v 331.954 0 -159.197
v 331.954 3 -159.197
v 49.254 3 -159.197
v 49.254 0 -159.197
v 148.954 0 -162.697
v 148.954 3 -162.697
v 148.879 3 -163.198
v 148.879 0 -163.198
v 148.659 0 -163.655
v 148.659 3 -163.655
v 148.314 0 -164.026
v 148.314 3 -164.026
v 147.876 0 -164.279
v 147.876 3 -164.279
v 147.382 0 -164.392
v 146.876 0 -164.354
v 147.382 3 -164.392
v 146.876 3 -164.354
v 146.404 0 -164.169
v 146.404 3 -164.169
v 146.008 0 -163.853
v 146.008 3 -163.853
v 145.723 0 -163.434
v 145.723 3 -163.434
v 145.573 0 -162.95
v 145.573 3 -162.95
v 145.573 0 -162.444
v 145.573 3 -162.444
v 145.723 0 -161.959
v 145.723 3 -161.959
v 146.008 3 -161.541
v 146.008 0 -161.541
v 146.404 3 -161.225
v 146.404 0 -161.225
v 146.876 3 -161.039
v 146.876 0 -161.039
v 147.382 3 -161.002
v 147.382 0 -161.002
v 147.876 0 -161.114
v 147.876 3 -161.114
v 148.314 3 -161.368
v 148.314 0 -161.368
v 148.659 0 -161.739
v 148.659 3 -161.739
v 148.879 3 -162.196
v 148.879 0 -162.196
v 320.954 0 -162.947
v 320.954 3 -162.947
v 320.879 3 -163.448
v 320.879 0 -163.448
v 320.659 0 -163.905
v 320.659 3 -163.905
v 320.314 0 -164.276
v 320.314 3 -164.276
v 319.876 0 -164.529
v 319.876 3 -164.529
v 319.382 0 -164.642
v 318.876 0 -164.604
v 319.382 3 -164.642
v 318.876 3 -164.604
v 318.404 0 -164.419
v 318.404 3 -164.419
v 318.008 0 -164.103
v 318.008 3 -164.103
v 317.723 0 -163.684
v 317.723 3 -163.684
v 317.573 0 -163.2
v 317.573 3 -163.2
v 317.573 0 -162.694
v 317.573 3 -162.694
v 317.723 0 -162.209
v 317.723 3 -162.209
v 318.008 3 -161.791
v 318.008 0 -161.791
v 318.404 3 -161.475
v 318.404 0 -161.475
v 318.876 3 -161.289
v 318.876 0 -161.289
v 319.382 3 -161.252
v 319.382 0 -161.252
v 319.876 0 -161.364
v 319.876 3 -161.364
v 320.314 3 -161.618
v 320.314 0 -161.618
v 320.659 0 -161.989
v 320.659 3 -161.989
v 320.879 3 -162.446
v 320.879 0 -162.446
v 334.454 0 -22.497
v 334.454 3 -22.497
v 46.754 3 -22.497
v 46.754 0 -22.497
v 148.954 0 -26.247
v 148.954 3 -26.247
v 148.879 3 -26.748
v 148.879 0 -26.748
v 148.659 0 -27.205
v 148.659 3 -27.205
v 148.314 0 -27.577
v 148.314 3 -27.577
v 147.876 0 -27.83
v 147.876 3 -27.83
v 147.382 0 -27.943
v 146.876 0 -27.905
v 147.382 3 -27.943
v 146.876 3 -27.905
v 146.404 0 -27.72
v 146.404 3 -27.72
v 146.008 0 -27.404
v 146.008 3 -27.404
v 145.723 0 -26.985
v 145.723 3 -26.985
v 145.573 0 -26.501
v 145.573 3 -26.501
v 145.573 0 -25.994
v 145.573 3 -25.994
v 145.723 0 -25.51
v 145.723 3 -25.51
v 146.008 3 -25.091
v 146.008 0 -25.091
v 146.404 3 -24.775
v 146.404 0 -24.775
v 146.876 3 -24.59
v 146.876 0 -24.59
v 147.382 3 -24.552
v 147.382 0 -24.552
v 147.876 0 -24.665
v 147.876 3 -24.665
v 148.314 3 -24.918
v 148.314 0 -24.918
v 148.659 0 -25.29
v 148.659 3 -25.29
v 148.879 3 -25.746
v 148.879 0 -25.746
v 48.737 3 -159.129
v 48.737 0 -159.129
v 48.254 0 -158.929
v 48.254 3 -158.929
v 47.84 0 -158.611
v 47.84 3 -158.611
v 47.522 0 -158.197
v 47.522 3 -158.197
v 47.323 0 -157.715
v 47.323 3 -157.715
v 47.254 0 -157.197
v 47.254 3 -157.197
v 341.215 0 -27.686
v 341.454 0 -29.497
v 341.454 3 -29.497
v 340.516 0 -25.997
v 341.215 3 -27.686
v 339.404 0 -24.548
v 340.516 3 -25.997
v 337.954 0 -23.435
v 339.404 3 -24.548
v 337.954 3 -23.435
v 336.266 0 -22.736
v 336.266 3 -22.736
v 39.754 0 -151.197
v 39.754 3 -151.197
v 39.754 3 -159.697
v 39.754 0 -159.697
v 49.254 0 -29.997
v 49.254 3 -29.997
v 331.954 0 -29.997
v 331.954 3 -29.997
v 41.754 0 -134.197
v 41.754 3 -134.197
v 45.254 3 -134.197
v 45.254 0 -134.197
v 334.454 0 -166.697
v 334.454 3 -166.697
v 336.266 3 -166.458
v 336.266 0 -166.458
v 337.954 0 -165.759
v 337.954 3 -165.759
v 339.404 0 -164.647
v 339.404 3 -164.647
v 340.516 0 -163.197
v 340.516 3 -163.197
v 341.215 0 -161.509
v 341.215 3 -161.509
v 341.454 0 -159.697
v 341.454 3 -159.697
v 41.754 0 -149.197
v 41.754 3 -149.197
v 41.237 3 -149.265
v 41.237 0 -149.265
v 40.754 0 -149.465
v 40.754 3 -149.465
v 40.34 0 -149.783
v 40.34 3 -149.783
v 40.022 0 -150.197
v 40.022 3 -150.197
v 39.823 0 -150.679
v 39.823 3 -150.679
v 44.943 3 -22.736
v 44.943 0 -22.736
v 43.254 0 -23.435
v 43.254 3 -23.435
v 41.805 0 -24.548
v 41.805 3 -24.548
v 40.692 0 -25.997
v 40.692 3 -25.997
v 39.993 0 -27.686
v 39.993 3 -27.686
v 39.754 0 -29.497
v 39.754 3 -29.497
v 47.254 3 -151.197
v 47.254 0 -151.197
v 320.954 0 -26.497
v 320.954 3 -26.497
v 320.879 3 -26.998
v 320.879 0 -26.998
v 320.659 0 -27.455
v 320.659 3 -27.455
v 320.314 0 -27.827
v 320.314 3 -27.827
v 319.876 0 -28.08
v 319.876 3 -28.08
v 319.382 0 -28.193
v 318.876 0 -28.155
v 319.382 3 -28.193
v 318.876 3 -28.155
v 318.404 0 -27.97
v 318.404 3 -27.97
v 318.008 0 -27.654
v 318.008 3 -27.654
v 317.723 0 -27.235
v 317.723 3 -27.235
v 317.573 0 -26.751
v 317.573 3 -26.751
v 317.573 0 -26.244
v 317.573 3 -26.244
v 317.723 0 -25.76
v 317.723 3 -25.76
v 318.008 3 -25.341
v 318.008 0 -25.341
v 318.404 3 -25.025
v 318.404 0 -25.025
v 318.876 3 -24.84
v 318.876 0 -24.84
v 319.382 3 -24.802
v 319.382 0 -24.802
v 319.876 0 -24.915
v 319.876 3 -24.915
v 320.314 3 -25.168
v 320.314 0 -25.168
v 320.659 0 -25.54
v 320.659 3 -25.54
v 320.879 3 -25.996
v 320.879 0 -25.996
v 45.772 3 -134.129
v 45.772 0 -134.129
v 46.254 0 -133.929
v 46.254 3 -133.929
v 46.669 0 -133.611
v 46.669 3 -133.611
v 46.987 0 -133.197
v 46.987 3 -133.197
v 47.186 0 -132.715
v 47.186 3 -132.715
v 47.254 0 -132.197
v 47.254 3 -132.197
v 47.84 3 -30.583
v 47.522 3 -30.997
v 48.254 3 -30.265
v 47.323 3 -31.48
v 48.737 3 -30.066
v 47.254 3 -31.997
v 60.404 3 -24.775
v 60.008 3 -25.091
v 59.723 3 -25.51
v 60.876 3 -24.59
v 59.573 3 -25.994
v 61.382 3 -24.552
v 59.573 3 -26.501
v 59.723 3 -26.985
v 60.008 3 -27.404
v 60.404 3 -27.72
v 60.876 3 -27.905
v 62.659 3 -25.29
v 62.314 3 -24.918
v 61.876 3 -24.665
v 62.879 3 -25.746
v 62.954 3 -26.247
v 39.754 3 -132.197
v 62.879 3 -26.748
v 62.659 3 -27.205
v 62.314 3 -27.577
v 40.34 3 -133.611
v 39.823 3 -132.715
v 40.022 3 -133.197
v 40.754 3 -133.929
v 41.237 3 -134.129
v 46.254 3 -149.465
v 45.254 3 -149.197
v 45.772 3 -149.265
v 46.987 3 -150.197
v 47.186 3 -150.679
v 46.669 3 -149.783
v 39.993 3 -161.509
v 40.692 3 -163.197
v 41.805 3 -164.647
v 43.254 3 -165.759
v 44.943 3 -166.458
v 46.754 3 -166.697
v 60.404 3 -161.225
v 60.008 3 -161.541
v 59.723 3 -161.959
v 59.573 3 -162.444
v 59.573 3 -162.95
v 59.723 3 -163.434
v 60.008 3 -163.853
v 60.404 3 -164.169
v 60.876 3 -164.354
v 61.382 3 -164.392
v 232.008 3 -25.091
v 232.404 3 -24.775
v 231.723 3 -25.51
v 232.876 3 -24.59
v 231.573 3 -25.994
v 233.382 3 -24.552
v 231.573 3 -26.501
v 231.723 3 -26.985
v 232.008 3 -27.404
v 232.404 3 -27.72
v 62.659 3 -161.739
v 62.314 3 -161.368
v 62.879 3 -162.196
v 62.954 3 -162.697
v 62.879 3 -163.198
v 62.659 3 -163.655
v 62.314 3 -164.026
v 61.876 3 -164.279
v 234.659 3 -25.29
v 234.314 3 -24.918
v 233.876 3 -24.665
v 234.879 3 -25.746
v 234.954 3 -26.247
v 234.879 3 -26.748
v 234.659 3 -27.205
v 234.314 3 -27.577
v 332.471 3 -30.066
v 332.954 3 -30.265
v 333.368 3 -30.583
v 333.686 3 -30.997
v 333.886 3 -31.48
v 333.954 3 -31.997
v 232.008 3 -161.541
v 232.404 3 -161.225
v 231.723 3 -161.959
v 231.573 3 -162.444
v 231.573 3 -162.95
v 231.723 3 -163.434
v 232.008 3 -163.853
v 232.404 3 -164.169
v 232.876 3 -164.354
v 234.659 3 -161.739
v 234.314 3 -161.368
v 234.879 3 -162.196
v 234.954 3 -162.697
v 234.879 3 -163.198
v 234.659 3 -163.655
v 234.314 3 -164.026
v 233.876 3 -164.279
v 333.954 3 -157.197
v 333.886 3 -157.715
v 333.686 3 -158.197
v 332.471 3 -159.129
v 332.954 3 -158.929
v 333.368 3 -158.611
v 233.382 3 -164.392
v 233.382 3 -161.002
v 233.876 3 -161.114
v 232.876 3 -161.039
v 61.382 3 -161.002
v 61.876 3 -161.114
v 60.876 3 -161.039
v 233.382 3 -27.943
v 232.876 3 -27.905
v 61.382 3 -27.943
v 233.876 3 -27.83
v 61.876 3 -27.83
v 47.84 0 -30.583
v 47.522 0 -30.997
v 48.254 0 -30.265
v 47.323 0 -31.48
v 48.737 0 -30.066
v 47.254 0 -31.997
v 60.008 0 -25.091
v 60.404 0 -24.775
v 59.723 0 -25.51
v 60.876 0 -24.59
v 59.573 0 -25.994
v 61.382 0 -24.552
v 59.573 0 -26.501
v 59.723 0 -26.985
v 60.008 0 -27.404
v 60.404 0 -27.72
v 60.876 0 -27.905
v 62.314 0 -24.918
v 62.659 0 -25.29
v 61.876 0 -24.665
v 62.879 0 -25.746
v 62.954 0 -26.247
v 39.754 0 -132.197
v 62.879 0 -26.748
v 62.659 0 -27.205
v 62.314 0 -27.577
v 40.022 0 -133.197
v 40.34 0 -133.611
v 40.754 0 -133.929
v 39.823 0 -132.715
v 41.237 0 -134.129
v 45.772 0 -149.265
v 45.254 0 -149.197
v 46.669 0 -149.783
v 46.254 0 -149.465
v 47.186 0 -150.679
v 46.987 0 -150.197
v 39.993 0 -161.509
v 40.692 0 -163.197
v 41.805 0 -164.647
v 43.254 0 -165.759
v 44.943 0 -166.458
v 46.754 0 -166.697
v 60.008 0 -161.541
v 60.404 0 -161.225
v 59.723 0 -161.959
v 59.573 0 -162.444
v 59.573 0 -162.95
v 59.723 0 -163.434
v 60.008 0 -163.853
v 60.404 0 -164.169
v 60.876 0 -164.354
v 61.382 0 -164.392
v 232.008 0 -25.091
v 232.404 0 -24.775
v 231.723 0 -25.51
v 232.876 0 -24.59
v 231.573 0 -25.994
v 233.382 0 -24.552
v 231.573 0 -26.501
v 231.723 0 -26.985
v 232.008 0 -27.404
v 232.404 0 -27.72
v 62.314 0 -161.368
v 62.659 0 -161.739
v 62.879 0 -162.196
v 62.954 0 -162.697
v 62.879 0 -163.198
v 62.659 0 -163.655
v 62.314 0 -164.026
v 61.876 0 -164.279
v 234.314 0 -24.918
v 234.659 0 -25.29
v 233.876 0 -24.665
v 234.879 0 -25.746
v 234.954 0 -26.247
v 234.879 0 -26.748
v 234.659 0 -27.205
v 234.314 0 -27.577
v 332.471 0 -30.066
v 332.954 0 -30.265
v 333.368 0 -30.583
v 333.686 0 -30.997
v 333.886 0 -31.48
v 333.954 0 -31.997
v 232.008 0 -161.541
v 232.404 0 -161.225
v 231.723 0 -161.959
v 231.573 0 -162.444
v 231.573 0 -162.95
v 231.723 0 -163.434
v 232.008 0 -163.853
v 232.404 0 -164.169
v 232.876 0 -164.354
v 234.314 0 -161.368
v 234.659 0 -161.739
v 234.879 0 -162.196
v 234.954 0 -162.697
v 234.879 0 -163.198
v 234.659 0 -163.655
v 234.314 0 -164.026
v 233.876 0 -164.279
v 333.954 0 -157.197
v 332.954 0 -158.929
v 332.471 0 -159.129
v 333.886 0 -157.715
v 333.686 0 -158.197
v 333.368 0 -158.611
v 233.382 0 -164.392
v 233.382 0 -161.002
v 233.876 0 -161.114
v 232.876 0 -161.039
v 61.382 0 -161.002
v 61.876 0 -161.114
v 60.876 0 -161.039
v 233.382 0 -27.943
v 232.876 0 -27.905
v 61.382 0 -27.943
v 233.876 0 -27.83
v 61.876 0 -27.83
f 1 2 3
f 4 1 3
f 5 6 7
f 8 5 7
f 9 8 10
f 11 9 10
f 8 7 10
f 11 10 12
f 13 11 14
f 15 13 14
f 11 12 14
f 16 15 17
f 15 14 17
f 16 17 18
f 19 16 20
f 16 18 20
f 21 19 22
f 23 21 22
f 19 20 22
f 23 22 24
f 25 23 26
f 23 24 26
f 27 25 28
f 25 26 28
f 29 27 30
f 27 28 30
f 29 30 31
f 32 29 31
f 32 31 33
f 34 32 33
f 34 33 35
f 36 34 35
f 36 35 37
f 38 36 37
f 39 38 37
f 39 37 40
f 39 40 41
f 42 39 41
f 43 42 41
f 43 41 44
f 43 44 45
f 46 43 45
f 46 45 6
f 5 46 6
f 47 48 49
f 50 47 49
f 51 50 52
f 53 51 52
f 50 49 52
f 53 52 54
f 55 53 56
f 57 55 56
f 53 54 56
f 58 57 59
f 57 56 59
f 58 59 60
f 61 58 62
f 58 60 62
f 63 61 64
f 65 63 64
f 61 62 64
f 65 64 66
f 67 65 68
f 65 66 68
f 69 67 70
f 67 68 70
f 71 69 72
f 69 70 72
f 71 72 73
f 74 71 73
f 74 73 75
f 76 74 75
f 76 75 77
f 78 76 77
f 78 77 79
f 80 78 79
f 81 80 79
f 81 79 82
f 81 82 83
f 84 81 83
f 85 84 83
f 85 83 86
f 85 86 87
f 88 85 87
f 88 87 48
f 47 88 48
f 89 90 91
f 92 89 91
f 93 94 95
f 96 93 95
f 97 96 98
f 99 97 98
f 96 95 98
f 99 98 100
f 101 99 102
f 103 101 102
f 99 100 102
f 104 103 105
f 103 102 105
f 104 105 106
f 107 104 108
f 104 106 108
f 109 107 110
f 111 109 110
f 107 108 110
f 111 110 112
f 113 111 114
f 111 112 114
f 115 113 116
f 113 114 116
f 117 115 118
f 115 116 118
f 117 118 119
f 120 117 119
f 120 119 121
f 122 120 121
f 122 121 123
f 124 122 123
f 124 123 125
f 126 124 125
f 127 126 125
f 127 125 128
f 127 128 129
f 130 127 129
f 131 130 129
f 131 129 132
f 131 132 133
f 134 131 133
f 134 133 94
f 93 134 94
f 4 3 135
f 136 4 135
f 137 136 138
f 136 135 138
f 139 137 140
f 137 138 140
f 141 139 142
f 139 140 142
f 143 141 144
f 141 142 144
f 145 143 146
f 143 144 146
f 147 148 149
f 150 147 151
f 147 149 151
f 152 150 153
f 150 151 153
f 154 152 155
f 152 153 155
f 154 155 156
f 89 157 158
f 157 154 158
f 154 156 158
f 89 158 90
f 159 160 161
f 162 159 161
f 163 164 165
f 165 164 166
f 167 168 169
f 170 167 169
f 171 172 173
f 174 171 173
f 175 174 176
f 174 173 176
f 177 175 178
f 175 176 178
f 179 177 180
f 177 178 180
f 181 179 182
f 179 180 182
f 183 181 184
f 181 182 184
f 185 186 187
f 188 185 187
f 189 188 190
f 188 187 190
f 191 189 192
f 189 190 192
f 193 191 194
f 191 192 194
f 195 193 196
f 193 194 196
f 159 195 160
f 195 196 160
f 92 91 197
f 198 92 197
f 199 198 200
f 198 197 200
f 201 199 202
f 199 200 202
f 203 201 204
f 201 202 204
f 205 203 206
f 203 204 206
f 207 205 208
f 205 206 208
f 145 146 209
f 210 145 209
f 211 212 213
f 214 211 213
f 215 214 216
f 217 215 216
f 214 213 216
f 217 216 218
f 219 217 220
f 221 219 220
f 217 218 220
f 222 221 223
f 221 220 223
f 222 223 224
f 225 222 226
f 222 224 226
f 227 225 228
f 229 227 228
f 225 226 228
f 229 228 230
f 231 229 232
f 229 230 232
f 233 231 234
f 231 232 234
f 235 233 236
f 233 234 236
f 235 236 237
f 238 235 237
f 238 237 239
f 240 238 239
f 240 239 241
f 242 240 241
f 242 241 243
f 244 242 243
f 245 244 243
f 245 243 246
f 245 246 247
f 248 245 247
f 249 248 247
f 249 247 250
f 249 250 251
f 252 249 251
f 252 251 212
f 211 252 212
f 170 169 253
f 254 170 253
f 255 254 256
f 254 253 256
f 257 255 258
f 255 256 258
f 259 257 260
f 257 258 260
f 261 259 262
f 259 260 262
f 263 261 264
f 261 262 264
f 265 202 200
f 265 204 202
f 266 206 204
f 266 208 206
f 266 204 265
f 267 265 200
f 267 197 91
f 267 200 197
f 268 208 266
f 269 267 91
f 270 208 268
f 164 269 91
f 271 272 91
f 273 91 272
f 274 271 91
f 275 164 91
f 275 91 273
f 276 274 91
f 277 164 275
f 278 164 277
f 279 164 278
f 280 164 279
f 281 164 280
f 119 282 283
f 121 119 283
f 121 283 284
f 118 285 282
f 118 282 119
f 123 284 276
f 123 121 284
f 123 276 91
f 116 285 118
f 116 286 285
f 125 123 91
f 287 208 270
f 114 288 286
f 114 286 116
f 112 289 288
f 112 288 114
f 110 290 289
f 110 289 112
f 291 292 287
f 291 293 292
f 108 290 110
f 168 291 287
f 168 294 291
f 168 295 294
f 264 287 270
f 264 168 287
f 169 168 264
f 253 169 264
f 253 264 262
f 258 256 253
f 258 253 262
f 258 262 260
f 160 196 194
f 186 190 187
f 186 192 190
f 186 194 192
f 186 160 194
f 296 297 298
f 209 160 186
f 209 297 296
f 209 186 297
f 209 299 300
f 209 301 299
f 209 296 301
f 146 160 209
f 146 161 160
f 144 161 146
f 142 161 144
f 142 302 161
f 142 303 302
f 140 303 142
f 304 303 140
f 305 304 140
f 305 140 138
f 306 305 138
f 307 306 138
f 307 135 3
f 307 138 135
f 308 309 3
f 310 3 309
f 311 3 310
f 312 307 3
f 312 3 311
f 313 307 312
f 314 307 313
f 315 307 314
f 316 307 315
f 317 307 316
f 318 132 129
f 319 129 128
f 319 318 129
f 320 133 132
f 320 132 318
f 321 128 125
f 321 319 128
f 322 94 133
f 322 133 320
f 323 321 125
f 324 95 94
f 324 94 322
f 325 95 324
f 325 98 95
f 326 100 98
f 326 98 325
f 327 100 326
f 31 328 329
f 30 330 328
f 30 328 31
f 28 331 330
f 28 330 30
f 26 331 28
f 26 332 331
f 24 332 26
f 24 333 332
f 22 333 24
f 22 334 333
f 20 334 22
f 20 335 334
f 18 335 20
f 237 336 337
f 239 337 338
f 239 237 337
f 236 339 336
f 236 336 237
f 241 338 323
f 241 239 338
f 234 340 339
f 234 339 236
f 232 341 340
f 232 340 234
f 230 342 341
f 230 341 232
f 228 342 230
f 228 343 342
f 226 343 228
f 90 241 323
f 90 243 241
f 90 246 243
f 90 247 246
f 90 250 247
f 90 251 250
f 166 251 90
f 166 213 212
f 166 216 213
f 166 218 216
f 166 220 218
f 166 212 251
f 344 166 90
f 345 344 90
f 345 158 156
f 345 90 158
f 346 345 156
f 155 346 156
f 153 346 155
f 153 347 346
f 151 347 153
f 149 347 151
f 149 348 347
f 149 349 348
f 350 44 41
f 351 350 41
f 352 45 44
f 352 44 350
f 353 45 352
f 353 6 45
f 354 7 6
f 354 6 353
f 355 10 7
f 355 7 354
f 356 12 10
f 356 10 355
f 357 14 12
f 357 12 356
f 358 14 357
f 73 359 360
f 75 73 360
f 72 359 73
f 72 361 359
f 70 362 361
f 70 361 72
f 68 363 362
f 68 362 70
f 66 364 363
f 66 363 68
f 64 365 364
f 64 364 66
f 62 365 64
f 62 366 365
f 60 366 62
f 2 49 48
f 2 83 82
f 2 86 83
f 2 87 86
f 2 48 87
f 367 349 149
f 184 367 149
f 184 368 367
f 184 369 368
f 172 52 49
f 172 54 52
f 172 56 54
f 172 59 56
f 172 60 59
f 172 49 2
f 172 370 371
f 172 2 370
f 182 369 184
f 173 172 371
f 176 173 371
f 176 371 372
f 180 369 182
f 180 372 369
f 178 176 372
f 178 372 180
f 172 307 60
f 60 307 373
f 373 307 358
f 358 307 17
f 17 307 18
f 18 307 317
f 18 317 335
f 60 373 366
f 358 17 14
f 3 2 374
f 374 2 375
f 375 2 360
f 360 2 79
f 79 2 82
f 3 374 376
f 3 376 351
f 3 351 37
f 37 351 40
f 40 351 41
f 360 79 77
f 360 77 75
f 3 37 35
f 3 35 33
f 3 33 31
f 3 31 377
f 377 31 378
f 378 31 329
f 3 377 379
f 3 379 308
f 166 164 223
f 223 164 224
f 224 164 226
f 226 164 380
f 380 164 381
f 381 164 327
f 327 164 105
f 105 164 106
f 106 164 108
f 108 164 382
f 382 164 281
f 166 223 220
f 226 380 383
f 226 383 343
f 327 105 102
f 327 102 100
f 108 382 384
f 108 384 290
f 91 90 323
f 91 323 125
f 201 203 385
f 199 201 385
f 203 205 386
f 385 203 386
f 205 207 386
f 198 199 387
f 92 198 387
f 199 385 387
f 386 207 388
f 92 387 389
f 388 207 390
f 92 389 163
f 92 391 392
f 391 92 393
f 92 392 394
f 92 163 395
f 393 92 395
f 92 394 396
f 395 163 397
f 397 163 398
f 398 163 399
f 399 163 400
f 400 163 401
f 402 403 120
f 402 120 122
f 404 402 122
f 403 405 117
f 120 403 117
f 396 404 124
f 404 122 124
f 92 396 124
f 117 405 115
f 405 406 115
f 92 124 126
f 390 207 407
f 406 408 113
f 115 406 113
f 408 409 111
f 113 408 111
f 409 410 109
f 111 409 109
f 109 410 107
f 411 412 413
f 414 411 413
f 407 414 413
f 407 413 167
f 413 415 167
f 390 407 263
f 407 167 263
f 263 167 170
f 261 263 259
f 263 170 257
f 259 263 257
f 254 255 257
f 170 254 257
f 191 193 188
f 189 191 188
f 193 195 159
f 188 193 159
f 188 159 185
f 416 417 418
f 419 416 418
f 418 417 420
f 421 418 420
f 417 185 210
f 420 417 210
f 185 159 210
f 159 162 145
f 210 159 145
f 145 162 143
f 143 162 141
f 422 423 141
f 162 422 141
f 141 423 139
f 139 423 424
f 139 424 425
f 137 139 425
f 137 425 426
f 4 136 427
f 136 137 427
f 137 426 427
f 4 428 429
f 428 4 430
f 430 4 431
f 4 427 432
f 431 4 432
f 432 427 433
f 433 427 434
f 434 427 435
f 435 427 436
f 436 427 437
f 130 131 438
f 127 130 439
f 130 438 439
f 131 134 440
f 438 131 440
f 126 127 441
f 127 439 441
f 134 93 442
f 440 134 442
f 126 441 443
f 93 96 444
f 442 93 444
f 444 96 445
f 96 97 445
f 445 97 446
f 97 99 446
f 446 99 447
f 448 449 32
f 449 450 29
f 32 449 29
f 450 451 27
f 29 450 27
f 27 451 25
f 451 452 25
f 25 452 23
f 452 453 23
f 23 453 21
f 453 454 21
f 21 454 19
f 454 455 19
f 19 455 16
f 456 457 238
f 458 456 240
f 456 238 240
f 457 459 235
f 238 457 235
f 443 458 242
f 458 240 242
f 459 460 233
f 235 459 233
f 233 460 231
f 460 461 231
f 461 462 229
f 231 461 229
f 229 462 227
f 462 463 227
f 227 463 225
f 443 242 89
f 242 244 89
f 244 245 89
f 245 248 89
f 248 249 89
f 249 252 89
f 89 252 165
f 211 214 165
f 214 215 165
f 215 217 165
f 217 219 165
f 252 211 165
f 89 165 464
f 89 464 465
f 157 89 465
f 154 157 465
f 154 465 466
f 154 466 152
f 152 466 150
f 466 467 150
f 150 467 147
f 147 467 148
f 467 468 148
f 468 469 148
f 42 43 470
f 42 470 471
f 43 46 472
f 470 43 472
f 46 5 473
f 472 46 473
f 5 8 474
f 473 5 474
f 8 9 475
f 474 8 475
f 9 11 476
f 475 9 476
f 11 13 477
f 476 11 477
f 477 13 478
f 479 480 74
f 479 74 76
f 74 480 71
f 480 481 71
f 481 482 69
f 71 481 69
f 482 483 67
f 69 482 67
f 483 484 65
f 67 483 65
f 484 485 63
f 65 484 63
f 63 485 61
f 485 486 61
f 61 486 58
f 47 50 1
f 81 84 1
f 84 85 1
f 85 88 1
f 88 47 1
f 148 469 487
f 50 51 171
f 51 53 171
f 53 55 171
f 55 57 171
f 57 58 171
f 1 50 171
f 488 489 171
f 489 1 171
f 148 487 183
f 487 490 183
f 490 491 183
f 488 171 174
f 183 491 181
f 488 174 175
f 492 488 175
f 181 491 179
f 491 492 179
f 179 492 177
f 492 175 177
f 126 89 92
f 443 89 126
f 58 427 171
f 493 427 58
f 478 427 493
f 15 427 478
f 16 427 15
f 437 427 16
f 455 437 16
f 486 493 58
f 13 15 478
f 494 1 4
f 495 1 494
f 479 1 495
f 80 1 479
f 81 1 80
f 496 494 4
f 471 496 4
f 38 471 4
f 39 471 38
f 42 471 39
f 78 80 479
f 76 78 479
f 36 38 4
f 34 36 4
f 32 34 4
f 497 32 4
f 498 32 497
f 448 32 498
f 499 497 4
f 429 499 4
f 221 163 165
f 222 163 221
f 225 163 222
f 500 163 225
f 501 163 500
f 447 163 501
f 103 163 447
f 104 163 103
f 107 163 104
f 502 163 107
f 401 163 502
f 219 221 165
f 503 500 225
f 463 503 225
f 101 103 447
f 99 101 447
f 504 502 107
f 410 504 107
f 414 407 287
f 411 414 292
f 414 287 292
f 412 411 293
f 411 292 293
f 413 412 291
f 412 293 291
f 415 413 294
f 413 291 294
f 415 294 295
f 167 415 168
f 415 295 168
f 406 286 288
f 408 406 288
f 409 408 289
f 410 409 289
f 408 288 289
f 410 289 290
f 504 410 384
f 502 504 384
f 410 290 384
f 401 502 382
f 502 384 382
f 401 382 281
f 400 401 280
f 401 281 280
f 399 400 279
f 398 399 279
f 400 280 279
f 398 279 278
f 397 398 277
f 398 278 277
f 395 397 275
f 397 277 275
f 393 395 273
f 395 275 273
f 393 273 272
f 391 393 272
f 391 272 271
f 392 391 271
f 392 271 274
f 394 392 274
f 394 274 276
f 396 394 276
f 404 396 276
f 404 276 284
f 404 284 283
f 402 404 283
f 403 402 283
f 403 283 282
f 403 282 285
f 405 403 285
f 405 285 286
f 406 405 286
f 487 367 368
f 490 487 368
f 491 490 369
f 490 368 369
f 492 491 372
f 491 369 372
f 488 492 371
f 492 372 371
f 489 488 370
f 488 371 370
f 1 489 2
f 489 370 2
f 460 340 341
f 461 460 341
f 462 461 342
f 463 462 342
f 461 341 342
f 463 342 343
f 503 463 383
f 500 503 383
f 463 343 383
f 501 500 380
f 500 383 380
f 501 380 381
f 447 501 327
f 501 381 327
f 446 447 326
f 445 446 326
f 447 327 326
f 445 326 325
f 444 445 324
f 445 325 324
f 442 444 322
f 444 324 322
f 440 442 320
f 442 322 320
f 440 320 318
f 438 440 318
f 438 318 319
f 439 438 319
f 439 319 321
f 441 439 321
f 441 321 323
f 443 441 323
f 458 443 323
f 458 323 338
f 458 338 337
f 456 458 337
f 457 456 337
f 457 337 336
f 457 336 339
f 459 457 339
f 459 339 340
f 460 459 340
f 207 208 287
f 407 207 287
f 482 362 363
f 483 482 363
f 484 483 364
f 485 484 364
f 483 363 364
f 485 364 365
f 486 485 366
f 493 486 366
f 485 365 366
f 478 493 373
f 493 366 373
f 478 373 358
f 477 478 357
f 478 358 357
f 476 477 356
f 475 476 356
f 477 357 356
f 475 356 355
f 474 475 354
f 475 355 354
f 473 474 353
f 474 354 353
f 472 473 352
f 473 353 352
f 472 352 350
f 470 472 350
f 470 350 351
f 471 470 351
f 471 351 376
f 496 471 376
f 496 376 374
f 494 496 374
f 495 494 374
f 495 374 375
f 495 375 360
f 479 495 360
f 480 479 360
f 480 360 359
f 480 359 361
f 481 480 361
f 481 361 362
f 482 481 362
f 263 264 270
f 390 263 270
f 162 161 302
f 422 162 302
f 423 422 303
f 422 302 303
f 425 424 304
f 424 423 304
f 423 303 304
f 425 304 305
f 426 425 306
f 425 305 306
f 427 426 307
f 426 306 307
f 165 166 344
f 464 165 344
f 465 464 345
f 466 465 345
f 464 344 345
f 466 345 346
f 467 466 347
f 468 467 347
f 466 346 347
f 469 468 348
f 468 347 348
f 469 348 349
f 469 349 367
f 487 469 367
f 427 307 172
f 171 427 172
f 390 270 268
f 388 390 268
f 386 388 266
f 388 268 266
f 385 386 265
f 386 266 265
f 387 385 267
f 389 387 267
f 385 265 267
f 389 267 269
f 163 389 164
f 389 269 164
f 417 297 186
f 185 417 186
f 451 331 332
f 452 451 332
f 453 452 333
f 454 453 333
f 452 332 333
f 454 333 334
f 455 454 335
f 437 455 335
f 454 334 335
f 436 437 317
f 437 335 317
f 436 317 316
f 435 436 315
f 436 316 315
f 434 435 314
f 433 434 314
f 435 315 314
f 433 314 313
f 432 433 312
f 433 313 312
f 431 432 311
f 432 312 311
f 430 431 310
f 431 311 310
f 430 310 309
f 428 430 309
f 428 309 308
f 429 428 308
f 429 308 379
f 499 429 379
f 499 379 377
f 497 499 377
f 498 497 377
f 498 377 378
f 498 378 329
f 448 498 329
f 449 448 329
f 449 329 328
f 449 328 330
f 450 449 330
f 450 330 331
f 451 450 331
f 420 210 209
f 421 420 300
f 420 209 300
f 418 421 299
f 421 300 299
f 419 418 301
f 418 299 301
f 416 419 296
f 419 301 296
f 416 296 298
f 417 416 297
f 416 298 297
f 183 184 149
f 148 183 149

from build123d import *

# Parameters (mm, degrees)
SKETCH1_W           = 350
SKETCH1_H           = 200
BOSS_EXTRUDE1_DEPTH = 3
SKETCH2_OUTSIDE_W   = 432.624
SKETCH2_OUTSIDE_H   = 282.624
SKETCH2_OUTSIDE_R   = 1.7
CUT_EXTRUDE1_DEPTH  = 10


with BuildPart() as part:
    # Sketch1 → Boss-Extrude1 (new body)
    with BuildSketch(Plane(origin=(0, 0, 0), x_dir=(1, 0, 0), z_dir=(0, 1, 0))):
        with Locations((175, 100)):
            Rectangle(SKETCH1_W, SKETCH1_H)
    extrude(amount=BOSS_EXTRUDE1_DEPTH)

    # Sketch2 outside → Cut-Extrude1 (cut)
    with BuildSketch(Plane(origin=(0, 3, 0), x_dir=(1, 0, 0), z_dir=(0, 1, 0))):
        with Locations((175, 100)):
            Rectangle(SKETCH2_OUTSIDE_W, SKETCH2_OUTSIDE_H)
        with BuildLine():
            Line((334.453835379, 22.4974157), (46.754485379, 22.4974157))
            ThreePointArc((46.754485379, 22.4974157), (41.80473791, 24.547668232), (39.754485379, 29.4974157))
            Line((39.754485379, 29.4974157), (39.754485379, 132.1968757))
            ThreePointArc((39.754485379, 132.1968757), (40.340271816, 133.611089262), (41.754485379, 134.1968757))
            Line((41.754485379, 134.1968757), (45.254485379, 134.1968757))
            ThreePointArc((45.254485379, 134.1968757), (46.668698941, 133.611089262), (47.254485379, 132.1968757))
            Line((47.254485379, 132.1968757), (47.254485379, 31.9974157))
            ThreePointArc((47.254485379, 31.9974157), (47.840271816, 30.583202138), (49.254485379, 29.9974157))
            Line((49.254485379, 29.9974157), (331.953835379, 29.9974157))
            ThreePointArc((331.953835379, 29.9974157), (333.368048941, 30.583202138), (333.953835379, 31.9974157))
            Line((333.953835379, 31.9974157), (333.953835379, 157.1968757))
            ThreePointArc((333.953835379, 157.1968757), (333.368048941, 158.611089262), (331.953835379, 159.1968757))
            Line((331.953835379, 159.1968757), (49.254485379, 159.1968757))
            ThreePointArc((49.254485379, 159.1968757), (47.840271816, 158.611089262), (47.254485379, 157.1968757))
            Line((47.254485379, 157.1968757), (47.254485379, 151.1968757))
            ThreePointArc((47.254485379, 151.1968757), (46.668698941, 149.782662138), (45.254485379, 149.1968757))
            Line((45.254485379, 149.1968757), (41.754485379, 149.1968757))
            ThreePointArc((41.754485379, 149.1968757), (40.340271816, 149.782662138), (39.754485379, 151.1968757))
            Line((39.754485379, 151.1968757), (39.754485379, 159.6968757))
            ThreePointArc((39.754485379, 159.6968757), (41.80473791, 164.646623168), (46.754485379, 166.6968757))
            Line((46.754485379, 166.6968757), (334.453835379, 166.6968757))
            ThreePointArc((334.453835379, 166.6968757), (339.403582847, 164.646623168), (341.453835379, 159.6968757))
            Line((341.453835379, 159.6968757), (341.453835379, 29.4974157))
            ThreePointArc((341.453835379, 29.4974157), (339.403582847, 24.547668232), (334.453835379, 22.4974157))
        make_face(mode=Mode.SUBTRACT)
        with Locations((319.254485379, 26.4974157)):
            Circle(SKETCH2_OUTSIDE_R)
        with Locations((233.254485379, 26.2474157)):
            Circle(SKETCH2_OUTSIDE_R)
        with Locations((61.254485379, 26.2474157)):
            Circle(SKETCH2_OUTSIDE_R)
        with Locations((147.254485379, 26.2474157)):
            Circle(SKETCH2_OUTSIDE_R)
        with Locations((319.254485379, 162.9468757)):
            Circle(SKETCH2_OUTSIDE_R)
        with Locations((233.254485379, 162.6968757)):
            Circle(SKETCH2_OUTSIDE_R)
        with Locations((61.254485379, 162.6968757)):
            Circle(SKETCH2_OUTSIDE_R)
        with Locations((147.254485379, 162.6968757)):
            Circle(SKETCH2_OUTSIDE_R)
    extrude(amount=-CUT_EXTRUDE1_DEPTH, mode=Mode.SUBTRACT)


solid = part.part
